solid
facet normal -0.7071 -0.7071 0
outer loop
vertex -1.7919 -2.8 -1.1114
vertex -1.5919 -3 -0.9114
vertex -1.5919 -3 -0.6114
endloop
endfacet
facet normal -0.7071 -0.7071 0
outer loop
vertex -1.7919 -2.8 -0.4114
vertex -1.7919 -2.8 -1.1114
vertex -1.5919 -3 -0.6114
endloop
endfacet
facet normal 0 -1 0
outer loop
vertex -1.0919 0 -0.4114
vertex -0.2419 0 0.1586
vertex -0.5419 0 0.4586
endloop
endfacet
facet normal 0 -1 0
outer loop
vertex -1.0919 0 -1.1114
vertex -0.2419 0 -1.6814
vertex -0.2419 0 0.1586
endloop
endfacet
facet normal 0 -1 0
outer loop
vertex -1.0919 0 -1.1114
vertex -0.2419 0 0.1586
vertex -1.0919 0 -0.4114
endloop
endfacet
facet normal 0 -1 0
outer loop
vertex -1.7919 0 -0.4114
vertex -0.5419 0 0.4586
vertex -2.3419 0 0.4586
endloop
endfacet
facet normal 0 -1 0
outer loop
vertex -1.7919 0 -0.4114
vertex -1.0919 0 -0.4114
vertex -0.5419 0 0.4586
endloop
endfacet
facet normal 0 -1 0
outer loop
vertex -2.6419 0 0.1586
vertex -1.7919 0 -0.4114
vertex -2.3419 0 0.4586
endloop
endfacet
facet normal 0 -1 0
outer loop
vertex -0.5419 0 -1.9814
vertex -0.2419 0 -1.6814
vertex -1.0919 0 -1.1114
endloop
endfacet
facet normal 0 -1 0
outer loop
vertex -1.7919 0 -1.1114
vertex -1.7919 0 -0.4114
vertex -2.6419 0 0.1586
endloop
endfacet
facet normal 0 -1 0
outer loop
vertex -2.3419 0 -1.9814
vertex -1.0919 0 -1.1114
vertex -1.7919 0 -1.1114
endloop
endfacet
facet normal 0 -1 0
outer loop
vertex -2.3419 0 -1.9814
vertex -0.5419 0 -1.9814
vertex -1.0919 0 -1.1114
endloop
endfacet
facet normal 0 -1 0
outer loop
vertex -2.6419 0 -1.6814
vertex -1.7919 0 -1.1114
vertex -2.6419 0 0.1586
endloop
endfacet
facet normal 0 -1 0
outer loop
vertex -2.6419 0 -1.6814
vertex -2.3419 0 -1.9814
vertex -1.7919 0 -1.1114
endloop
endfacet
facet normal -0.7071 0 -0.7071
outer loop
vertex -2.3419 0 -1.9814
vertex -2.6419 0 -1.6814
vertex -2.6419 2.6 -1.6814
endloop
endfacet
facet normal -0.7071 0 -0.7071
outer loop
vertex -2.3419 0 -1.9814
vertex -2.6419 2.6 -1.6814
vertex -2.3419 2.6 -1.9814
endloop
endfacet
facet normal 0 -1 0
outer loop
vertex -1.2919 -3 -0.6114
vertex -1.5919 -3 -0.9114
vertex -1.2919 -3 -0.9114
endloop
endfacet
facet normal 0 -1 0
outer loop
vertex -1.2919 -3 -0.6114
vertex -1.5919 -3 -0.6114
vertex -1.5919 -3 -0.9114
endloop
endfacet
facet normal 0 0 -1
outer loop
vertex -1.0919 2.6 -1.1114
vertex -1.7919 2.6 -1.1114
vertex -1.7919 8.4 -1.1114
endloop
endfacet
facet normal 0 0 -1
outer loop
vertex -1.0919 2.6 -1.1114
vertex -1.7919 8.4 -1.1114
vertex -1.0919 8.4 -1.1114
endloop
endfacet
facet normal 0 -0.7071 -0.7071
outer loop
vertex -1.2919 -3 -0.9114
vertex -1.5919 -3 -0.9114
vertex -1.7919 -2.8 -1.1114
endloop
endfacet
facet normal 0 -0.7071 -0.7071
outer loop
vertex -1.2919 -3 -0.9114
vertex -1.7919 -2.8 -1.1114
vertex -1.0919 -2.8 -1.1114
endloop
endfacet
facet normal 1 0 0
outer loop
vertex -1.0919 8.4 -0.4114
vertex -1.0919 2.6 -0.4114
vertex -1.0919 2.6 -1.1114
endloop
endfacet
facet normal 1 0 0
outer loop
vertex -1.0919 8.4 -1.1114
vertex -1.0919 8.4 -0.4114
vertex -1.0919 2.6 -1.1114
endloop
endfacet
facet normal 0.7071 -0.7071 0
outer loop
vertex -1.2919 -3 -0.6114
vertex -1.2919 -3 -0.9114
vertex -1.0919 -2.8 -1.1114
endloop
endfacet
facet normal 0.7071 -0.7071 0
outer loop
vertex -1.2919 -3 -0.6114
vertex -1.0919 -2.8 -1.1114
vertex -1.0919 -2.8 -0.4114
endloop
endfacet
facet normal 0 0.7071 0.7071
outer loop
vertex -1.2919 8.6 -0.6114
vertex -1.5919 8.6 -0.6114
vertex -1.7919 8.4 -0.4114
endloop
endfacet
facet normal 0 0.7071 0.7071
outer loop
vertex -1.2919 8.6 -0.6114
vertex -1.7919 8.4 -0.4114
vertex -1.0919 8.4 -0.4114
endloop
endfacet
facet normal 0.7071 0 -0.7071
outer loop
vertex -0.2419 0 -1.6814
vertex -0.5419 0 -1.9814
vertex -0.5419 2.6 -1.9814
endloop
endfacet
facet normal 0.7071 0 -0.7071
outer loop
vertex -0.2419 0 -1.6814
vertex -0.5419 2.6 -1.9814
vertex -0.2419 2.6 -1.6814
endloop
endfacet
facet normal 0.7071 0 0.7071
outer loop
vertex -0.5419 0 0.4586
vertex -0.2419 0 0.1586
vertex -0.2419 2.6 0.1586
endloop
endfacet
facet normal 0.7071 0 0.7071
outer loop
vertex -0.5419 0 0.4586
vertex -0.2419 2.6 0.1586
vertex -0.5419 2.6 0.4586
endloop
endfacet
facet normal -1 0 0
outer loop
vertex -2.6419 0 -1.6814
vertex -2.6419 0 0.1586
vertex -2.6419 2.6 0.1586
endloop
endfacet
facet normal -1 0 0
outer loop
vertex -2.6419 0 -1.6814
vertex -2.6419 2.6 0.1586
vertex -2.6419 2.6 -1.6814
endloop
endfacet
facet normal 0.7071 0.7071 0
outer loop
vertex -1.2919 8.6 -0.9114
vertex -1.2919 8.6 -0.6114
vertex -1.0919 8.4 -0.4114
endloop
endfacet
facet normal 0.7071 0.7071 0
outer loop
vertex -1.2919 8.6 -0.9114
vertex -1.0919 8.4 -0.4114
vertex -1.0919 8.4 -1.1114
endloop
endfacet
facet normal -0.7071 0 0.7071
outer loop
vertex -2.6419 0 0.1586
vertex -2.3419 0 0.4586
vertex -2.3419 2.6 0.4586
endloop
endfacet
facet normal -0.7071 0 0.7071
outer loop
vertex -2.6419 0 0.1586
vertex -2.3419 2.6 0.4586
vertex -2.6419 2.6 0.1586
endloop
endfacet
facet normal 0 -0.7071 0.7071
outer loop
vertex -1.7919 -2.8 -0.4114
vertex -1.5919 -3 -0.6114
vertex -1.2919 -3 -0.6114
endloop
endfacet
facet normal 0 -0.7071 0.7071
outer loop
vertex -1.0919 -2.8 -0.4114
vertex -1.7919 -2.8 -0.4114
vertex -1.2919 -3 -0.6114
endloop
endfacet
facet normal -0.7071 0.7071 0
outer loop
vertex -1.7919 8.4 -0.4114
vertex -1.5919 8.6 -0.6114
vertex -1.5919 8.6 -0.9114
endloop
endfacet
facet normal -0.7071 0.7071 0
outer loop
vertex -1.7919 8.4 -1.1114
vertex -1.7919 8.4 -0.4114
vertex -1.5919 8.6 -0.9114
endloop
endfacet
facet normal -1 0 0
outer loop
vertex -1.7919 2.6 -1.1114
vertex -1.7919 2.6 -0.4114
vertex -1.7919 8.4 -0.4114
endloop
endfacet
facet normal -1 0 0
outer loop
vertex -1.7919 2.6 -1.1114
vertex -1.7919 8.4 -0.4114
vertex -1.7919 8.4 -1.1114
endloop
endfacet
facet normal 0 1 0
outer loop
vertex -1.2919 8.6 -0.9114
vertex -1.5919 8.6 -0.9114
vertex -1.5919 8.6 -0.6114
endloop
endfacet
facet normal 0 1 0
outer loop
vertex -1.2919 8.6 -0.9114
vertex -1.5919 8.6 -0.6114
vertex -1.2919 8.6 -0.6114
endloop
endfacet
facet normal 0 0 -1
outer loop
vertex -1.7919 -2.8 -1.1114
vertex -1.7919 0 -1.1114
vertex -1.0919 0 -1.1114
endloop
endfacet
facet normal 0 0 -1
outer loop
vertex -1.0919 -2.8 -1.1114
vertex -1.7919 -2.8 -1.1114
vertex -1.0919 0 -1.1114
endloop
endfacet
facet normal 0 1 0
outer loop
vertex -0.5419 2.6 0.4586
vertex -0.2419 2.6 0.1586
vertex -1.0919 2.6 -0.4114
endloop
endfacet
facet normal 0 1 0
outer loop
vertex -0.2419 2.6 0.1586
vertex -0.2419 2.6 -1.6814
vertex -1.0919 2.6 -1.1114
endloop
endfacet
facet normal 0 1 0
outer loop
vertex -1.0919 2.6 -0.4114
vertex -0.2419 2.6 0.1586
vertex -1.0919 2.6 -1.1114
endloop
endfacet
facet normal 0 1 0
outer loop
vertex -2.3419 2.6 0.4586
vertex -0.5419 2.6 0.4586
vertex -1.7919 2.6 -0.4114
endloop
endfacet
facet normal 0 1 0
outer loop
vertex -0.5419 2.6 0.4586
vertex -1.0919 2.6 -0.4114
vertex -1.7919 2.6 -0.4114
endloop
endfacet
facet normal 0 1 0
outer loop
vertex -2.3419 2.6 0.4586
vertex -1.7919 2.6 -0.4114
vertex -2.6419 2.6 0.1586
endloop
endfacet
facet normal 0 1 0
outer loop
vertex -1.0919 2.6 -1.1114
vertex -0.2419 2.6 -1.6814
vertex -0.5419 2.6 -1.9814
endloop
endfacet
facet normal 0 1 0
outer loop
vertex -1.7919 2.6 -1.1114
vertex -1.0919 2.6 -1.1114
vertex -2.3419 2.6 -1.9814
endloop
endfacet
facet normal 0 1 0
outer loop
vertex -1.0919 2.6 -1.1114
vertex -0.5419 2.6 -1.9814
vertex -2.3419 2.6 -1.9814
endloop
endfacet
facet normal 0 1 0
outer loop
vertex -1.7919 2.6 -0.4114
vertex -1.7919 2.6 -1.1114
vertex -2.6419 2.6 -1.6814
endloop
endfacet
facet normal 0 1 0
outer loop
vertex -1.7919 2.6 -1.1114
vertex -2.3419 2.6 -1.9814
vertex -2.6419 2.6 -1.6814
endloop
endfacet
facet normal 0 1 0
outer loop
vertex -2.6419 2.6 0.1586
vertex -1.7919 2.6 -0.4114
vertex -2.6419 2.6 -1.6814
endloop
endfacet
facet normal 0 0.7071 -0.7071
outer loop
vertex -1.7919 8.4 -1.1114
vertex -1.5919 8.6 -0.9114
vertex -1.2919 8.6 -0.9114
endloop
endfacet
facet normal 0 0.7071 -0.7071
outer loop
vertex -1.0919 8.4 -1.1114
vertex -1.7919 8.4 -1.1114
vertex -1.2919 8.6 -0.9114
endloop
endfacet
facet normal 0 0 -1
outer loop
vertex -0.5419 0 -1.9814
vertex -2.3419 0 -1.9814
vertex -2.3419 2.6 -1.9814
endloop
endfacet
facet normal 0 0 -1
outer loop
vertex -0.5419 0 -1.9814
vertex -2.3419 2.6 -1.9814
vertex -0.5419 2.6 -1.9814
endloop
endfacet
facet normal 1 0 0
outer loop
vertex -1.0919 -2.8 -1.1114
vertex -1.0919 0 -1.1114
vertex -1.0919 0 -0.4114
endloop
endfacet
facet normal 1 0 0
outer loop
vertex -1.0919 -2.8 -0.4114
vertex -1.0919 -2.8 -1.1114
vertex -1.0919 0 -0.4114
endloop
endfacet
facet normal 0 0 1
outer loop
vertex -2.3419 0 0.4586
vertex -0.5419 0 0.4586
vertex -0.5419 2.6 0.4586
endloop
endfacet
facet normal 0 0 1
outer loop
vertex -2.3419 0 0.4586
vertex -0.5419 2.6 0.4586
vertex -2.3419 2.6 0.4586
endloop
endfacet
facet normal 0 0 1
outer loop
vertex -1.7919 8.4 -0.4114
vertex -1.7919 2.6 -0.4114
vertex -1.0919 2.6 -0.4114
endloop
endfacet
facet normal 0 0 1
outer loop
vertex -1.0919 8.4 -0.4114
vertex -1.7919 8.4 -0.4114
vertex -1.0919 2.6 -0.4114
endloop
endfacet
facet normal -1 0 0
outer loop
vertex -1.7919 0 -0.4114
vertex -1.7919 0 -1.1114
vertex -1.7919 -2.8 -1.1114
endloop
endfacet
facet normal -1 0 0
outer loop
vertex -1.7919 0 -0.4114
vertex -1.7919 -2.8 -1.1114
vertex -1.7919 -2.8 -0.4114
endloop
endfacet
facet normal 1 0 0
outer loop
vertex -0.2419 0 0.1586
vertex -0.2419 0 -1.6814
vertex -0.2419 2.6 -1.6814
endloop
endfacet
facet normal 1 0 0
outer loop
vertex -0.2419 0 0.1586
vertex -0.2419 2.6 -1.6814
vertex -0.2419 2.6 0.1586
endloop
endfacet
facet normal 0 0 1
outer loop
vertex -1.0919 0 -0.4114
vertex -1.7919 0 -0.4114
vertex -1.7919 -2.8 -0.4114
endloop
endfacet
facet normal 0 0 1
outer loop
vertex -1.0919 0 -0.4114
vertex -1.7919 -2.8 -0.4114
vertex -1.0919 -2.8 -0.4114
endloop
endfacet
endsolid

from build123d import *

# Parameters (mm, degrees)
EXTRUDE_1_DEPTH = 2.6
SKETCH_2_W      = 0.7
SKETCH_2_H      = 0.7
EXTRUDE_2_DEPTH = 6
SKETCH_3_W      = 0.7
SKETCH_3_H      = 0.7
EXTRUDE_3_DEPTH = 3
CHAMFER_1_SIZE  = 0.2


with BuildPart() as part:
    # Sketch 1 → Extrude 1 (new body)
    with BuildSketch(Plane(origin=(0, 0, 0), x_dir=(1, 0, 0), z_dir=(0, 1, 0))):
        Polygon((-2.641860465, 1.681395349), (-2.341860465, 1.981395349), (-0.541860465, 1.981395349), (-0.241860465, 1.681395349), (-0.241860465, -0.158604651), (-0.541860465, -0.458604651), (-2.341860465, -0.458604651), (-2.641860465, -0.158604651), align=None)
    extrude(amount=EXTRUDE_1_DEPTH)

    # Sketch 2 → Extrude 2 (add)
    with BuildSketch(Plane(origin=(0, 2.6, 0), x_dir=(1, 0, 0), z_dir=(0, 1, 0))):
        with Locations((-1.441860465, 0.761395349)):
            Rectangle(SKETCH_2_W, SKETCH_2_H)
    extrude(amount=EXTRUDE_2_DEPTH)

    # Sketch 3 → Extrude 3 (add)
    with BuildSketch(Plane.XZ):
        with Locations((-1.441860465, -0.761395349)):
            Rectangle(SKETCH_3_W, SKETCH_3_H)
    extrude(amount=EXTRUDE_3_DEPTH)

    # Chamfer 1
    chamfer_1_edges = [part.edges().sort_by_distance(p)[0] for p in [
        (-1.091860465, 8.6, -0.761395349),
        (-1.441860465, 8.6, -1.111395349),
        (-1.791860465, 8.6, -0.761395349),
        (-1.441860465, 8.6, -0.411395349),
        (-1.441860465, -3, -1.111395349),
        (-1.091860465, -3, -0.761395349),
        (-1.441860465, -3, -0.411395349),
        (-1.791860465, -3, -0.761395349),
    ]]
    chamfer(chamfer_1_edges, length=CHAMFER_1_SIZE)


solid = part.part
